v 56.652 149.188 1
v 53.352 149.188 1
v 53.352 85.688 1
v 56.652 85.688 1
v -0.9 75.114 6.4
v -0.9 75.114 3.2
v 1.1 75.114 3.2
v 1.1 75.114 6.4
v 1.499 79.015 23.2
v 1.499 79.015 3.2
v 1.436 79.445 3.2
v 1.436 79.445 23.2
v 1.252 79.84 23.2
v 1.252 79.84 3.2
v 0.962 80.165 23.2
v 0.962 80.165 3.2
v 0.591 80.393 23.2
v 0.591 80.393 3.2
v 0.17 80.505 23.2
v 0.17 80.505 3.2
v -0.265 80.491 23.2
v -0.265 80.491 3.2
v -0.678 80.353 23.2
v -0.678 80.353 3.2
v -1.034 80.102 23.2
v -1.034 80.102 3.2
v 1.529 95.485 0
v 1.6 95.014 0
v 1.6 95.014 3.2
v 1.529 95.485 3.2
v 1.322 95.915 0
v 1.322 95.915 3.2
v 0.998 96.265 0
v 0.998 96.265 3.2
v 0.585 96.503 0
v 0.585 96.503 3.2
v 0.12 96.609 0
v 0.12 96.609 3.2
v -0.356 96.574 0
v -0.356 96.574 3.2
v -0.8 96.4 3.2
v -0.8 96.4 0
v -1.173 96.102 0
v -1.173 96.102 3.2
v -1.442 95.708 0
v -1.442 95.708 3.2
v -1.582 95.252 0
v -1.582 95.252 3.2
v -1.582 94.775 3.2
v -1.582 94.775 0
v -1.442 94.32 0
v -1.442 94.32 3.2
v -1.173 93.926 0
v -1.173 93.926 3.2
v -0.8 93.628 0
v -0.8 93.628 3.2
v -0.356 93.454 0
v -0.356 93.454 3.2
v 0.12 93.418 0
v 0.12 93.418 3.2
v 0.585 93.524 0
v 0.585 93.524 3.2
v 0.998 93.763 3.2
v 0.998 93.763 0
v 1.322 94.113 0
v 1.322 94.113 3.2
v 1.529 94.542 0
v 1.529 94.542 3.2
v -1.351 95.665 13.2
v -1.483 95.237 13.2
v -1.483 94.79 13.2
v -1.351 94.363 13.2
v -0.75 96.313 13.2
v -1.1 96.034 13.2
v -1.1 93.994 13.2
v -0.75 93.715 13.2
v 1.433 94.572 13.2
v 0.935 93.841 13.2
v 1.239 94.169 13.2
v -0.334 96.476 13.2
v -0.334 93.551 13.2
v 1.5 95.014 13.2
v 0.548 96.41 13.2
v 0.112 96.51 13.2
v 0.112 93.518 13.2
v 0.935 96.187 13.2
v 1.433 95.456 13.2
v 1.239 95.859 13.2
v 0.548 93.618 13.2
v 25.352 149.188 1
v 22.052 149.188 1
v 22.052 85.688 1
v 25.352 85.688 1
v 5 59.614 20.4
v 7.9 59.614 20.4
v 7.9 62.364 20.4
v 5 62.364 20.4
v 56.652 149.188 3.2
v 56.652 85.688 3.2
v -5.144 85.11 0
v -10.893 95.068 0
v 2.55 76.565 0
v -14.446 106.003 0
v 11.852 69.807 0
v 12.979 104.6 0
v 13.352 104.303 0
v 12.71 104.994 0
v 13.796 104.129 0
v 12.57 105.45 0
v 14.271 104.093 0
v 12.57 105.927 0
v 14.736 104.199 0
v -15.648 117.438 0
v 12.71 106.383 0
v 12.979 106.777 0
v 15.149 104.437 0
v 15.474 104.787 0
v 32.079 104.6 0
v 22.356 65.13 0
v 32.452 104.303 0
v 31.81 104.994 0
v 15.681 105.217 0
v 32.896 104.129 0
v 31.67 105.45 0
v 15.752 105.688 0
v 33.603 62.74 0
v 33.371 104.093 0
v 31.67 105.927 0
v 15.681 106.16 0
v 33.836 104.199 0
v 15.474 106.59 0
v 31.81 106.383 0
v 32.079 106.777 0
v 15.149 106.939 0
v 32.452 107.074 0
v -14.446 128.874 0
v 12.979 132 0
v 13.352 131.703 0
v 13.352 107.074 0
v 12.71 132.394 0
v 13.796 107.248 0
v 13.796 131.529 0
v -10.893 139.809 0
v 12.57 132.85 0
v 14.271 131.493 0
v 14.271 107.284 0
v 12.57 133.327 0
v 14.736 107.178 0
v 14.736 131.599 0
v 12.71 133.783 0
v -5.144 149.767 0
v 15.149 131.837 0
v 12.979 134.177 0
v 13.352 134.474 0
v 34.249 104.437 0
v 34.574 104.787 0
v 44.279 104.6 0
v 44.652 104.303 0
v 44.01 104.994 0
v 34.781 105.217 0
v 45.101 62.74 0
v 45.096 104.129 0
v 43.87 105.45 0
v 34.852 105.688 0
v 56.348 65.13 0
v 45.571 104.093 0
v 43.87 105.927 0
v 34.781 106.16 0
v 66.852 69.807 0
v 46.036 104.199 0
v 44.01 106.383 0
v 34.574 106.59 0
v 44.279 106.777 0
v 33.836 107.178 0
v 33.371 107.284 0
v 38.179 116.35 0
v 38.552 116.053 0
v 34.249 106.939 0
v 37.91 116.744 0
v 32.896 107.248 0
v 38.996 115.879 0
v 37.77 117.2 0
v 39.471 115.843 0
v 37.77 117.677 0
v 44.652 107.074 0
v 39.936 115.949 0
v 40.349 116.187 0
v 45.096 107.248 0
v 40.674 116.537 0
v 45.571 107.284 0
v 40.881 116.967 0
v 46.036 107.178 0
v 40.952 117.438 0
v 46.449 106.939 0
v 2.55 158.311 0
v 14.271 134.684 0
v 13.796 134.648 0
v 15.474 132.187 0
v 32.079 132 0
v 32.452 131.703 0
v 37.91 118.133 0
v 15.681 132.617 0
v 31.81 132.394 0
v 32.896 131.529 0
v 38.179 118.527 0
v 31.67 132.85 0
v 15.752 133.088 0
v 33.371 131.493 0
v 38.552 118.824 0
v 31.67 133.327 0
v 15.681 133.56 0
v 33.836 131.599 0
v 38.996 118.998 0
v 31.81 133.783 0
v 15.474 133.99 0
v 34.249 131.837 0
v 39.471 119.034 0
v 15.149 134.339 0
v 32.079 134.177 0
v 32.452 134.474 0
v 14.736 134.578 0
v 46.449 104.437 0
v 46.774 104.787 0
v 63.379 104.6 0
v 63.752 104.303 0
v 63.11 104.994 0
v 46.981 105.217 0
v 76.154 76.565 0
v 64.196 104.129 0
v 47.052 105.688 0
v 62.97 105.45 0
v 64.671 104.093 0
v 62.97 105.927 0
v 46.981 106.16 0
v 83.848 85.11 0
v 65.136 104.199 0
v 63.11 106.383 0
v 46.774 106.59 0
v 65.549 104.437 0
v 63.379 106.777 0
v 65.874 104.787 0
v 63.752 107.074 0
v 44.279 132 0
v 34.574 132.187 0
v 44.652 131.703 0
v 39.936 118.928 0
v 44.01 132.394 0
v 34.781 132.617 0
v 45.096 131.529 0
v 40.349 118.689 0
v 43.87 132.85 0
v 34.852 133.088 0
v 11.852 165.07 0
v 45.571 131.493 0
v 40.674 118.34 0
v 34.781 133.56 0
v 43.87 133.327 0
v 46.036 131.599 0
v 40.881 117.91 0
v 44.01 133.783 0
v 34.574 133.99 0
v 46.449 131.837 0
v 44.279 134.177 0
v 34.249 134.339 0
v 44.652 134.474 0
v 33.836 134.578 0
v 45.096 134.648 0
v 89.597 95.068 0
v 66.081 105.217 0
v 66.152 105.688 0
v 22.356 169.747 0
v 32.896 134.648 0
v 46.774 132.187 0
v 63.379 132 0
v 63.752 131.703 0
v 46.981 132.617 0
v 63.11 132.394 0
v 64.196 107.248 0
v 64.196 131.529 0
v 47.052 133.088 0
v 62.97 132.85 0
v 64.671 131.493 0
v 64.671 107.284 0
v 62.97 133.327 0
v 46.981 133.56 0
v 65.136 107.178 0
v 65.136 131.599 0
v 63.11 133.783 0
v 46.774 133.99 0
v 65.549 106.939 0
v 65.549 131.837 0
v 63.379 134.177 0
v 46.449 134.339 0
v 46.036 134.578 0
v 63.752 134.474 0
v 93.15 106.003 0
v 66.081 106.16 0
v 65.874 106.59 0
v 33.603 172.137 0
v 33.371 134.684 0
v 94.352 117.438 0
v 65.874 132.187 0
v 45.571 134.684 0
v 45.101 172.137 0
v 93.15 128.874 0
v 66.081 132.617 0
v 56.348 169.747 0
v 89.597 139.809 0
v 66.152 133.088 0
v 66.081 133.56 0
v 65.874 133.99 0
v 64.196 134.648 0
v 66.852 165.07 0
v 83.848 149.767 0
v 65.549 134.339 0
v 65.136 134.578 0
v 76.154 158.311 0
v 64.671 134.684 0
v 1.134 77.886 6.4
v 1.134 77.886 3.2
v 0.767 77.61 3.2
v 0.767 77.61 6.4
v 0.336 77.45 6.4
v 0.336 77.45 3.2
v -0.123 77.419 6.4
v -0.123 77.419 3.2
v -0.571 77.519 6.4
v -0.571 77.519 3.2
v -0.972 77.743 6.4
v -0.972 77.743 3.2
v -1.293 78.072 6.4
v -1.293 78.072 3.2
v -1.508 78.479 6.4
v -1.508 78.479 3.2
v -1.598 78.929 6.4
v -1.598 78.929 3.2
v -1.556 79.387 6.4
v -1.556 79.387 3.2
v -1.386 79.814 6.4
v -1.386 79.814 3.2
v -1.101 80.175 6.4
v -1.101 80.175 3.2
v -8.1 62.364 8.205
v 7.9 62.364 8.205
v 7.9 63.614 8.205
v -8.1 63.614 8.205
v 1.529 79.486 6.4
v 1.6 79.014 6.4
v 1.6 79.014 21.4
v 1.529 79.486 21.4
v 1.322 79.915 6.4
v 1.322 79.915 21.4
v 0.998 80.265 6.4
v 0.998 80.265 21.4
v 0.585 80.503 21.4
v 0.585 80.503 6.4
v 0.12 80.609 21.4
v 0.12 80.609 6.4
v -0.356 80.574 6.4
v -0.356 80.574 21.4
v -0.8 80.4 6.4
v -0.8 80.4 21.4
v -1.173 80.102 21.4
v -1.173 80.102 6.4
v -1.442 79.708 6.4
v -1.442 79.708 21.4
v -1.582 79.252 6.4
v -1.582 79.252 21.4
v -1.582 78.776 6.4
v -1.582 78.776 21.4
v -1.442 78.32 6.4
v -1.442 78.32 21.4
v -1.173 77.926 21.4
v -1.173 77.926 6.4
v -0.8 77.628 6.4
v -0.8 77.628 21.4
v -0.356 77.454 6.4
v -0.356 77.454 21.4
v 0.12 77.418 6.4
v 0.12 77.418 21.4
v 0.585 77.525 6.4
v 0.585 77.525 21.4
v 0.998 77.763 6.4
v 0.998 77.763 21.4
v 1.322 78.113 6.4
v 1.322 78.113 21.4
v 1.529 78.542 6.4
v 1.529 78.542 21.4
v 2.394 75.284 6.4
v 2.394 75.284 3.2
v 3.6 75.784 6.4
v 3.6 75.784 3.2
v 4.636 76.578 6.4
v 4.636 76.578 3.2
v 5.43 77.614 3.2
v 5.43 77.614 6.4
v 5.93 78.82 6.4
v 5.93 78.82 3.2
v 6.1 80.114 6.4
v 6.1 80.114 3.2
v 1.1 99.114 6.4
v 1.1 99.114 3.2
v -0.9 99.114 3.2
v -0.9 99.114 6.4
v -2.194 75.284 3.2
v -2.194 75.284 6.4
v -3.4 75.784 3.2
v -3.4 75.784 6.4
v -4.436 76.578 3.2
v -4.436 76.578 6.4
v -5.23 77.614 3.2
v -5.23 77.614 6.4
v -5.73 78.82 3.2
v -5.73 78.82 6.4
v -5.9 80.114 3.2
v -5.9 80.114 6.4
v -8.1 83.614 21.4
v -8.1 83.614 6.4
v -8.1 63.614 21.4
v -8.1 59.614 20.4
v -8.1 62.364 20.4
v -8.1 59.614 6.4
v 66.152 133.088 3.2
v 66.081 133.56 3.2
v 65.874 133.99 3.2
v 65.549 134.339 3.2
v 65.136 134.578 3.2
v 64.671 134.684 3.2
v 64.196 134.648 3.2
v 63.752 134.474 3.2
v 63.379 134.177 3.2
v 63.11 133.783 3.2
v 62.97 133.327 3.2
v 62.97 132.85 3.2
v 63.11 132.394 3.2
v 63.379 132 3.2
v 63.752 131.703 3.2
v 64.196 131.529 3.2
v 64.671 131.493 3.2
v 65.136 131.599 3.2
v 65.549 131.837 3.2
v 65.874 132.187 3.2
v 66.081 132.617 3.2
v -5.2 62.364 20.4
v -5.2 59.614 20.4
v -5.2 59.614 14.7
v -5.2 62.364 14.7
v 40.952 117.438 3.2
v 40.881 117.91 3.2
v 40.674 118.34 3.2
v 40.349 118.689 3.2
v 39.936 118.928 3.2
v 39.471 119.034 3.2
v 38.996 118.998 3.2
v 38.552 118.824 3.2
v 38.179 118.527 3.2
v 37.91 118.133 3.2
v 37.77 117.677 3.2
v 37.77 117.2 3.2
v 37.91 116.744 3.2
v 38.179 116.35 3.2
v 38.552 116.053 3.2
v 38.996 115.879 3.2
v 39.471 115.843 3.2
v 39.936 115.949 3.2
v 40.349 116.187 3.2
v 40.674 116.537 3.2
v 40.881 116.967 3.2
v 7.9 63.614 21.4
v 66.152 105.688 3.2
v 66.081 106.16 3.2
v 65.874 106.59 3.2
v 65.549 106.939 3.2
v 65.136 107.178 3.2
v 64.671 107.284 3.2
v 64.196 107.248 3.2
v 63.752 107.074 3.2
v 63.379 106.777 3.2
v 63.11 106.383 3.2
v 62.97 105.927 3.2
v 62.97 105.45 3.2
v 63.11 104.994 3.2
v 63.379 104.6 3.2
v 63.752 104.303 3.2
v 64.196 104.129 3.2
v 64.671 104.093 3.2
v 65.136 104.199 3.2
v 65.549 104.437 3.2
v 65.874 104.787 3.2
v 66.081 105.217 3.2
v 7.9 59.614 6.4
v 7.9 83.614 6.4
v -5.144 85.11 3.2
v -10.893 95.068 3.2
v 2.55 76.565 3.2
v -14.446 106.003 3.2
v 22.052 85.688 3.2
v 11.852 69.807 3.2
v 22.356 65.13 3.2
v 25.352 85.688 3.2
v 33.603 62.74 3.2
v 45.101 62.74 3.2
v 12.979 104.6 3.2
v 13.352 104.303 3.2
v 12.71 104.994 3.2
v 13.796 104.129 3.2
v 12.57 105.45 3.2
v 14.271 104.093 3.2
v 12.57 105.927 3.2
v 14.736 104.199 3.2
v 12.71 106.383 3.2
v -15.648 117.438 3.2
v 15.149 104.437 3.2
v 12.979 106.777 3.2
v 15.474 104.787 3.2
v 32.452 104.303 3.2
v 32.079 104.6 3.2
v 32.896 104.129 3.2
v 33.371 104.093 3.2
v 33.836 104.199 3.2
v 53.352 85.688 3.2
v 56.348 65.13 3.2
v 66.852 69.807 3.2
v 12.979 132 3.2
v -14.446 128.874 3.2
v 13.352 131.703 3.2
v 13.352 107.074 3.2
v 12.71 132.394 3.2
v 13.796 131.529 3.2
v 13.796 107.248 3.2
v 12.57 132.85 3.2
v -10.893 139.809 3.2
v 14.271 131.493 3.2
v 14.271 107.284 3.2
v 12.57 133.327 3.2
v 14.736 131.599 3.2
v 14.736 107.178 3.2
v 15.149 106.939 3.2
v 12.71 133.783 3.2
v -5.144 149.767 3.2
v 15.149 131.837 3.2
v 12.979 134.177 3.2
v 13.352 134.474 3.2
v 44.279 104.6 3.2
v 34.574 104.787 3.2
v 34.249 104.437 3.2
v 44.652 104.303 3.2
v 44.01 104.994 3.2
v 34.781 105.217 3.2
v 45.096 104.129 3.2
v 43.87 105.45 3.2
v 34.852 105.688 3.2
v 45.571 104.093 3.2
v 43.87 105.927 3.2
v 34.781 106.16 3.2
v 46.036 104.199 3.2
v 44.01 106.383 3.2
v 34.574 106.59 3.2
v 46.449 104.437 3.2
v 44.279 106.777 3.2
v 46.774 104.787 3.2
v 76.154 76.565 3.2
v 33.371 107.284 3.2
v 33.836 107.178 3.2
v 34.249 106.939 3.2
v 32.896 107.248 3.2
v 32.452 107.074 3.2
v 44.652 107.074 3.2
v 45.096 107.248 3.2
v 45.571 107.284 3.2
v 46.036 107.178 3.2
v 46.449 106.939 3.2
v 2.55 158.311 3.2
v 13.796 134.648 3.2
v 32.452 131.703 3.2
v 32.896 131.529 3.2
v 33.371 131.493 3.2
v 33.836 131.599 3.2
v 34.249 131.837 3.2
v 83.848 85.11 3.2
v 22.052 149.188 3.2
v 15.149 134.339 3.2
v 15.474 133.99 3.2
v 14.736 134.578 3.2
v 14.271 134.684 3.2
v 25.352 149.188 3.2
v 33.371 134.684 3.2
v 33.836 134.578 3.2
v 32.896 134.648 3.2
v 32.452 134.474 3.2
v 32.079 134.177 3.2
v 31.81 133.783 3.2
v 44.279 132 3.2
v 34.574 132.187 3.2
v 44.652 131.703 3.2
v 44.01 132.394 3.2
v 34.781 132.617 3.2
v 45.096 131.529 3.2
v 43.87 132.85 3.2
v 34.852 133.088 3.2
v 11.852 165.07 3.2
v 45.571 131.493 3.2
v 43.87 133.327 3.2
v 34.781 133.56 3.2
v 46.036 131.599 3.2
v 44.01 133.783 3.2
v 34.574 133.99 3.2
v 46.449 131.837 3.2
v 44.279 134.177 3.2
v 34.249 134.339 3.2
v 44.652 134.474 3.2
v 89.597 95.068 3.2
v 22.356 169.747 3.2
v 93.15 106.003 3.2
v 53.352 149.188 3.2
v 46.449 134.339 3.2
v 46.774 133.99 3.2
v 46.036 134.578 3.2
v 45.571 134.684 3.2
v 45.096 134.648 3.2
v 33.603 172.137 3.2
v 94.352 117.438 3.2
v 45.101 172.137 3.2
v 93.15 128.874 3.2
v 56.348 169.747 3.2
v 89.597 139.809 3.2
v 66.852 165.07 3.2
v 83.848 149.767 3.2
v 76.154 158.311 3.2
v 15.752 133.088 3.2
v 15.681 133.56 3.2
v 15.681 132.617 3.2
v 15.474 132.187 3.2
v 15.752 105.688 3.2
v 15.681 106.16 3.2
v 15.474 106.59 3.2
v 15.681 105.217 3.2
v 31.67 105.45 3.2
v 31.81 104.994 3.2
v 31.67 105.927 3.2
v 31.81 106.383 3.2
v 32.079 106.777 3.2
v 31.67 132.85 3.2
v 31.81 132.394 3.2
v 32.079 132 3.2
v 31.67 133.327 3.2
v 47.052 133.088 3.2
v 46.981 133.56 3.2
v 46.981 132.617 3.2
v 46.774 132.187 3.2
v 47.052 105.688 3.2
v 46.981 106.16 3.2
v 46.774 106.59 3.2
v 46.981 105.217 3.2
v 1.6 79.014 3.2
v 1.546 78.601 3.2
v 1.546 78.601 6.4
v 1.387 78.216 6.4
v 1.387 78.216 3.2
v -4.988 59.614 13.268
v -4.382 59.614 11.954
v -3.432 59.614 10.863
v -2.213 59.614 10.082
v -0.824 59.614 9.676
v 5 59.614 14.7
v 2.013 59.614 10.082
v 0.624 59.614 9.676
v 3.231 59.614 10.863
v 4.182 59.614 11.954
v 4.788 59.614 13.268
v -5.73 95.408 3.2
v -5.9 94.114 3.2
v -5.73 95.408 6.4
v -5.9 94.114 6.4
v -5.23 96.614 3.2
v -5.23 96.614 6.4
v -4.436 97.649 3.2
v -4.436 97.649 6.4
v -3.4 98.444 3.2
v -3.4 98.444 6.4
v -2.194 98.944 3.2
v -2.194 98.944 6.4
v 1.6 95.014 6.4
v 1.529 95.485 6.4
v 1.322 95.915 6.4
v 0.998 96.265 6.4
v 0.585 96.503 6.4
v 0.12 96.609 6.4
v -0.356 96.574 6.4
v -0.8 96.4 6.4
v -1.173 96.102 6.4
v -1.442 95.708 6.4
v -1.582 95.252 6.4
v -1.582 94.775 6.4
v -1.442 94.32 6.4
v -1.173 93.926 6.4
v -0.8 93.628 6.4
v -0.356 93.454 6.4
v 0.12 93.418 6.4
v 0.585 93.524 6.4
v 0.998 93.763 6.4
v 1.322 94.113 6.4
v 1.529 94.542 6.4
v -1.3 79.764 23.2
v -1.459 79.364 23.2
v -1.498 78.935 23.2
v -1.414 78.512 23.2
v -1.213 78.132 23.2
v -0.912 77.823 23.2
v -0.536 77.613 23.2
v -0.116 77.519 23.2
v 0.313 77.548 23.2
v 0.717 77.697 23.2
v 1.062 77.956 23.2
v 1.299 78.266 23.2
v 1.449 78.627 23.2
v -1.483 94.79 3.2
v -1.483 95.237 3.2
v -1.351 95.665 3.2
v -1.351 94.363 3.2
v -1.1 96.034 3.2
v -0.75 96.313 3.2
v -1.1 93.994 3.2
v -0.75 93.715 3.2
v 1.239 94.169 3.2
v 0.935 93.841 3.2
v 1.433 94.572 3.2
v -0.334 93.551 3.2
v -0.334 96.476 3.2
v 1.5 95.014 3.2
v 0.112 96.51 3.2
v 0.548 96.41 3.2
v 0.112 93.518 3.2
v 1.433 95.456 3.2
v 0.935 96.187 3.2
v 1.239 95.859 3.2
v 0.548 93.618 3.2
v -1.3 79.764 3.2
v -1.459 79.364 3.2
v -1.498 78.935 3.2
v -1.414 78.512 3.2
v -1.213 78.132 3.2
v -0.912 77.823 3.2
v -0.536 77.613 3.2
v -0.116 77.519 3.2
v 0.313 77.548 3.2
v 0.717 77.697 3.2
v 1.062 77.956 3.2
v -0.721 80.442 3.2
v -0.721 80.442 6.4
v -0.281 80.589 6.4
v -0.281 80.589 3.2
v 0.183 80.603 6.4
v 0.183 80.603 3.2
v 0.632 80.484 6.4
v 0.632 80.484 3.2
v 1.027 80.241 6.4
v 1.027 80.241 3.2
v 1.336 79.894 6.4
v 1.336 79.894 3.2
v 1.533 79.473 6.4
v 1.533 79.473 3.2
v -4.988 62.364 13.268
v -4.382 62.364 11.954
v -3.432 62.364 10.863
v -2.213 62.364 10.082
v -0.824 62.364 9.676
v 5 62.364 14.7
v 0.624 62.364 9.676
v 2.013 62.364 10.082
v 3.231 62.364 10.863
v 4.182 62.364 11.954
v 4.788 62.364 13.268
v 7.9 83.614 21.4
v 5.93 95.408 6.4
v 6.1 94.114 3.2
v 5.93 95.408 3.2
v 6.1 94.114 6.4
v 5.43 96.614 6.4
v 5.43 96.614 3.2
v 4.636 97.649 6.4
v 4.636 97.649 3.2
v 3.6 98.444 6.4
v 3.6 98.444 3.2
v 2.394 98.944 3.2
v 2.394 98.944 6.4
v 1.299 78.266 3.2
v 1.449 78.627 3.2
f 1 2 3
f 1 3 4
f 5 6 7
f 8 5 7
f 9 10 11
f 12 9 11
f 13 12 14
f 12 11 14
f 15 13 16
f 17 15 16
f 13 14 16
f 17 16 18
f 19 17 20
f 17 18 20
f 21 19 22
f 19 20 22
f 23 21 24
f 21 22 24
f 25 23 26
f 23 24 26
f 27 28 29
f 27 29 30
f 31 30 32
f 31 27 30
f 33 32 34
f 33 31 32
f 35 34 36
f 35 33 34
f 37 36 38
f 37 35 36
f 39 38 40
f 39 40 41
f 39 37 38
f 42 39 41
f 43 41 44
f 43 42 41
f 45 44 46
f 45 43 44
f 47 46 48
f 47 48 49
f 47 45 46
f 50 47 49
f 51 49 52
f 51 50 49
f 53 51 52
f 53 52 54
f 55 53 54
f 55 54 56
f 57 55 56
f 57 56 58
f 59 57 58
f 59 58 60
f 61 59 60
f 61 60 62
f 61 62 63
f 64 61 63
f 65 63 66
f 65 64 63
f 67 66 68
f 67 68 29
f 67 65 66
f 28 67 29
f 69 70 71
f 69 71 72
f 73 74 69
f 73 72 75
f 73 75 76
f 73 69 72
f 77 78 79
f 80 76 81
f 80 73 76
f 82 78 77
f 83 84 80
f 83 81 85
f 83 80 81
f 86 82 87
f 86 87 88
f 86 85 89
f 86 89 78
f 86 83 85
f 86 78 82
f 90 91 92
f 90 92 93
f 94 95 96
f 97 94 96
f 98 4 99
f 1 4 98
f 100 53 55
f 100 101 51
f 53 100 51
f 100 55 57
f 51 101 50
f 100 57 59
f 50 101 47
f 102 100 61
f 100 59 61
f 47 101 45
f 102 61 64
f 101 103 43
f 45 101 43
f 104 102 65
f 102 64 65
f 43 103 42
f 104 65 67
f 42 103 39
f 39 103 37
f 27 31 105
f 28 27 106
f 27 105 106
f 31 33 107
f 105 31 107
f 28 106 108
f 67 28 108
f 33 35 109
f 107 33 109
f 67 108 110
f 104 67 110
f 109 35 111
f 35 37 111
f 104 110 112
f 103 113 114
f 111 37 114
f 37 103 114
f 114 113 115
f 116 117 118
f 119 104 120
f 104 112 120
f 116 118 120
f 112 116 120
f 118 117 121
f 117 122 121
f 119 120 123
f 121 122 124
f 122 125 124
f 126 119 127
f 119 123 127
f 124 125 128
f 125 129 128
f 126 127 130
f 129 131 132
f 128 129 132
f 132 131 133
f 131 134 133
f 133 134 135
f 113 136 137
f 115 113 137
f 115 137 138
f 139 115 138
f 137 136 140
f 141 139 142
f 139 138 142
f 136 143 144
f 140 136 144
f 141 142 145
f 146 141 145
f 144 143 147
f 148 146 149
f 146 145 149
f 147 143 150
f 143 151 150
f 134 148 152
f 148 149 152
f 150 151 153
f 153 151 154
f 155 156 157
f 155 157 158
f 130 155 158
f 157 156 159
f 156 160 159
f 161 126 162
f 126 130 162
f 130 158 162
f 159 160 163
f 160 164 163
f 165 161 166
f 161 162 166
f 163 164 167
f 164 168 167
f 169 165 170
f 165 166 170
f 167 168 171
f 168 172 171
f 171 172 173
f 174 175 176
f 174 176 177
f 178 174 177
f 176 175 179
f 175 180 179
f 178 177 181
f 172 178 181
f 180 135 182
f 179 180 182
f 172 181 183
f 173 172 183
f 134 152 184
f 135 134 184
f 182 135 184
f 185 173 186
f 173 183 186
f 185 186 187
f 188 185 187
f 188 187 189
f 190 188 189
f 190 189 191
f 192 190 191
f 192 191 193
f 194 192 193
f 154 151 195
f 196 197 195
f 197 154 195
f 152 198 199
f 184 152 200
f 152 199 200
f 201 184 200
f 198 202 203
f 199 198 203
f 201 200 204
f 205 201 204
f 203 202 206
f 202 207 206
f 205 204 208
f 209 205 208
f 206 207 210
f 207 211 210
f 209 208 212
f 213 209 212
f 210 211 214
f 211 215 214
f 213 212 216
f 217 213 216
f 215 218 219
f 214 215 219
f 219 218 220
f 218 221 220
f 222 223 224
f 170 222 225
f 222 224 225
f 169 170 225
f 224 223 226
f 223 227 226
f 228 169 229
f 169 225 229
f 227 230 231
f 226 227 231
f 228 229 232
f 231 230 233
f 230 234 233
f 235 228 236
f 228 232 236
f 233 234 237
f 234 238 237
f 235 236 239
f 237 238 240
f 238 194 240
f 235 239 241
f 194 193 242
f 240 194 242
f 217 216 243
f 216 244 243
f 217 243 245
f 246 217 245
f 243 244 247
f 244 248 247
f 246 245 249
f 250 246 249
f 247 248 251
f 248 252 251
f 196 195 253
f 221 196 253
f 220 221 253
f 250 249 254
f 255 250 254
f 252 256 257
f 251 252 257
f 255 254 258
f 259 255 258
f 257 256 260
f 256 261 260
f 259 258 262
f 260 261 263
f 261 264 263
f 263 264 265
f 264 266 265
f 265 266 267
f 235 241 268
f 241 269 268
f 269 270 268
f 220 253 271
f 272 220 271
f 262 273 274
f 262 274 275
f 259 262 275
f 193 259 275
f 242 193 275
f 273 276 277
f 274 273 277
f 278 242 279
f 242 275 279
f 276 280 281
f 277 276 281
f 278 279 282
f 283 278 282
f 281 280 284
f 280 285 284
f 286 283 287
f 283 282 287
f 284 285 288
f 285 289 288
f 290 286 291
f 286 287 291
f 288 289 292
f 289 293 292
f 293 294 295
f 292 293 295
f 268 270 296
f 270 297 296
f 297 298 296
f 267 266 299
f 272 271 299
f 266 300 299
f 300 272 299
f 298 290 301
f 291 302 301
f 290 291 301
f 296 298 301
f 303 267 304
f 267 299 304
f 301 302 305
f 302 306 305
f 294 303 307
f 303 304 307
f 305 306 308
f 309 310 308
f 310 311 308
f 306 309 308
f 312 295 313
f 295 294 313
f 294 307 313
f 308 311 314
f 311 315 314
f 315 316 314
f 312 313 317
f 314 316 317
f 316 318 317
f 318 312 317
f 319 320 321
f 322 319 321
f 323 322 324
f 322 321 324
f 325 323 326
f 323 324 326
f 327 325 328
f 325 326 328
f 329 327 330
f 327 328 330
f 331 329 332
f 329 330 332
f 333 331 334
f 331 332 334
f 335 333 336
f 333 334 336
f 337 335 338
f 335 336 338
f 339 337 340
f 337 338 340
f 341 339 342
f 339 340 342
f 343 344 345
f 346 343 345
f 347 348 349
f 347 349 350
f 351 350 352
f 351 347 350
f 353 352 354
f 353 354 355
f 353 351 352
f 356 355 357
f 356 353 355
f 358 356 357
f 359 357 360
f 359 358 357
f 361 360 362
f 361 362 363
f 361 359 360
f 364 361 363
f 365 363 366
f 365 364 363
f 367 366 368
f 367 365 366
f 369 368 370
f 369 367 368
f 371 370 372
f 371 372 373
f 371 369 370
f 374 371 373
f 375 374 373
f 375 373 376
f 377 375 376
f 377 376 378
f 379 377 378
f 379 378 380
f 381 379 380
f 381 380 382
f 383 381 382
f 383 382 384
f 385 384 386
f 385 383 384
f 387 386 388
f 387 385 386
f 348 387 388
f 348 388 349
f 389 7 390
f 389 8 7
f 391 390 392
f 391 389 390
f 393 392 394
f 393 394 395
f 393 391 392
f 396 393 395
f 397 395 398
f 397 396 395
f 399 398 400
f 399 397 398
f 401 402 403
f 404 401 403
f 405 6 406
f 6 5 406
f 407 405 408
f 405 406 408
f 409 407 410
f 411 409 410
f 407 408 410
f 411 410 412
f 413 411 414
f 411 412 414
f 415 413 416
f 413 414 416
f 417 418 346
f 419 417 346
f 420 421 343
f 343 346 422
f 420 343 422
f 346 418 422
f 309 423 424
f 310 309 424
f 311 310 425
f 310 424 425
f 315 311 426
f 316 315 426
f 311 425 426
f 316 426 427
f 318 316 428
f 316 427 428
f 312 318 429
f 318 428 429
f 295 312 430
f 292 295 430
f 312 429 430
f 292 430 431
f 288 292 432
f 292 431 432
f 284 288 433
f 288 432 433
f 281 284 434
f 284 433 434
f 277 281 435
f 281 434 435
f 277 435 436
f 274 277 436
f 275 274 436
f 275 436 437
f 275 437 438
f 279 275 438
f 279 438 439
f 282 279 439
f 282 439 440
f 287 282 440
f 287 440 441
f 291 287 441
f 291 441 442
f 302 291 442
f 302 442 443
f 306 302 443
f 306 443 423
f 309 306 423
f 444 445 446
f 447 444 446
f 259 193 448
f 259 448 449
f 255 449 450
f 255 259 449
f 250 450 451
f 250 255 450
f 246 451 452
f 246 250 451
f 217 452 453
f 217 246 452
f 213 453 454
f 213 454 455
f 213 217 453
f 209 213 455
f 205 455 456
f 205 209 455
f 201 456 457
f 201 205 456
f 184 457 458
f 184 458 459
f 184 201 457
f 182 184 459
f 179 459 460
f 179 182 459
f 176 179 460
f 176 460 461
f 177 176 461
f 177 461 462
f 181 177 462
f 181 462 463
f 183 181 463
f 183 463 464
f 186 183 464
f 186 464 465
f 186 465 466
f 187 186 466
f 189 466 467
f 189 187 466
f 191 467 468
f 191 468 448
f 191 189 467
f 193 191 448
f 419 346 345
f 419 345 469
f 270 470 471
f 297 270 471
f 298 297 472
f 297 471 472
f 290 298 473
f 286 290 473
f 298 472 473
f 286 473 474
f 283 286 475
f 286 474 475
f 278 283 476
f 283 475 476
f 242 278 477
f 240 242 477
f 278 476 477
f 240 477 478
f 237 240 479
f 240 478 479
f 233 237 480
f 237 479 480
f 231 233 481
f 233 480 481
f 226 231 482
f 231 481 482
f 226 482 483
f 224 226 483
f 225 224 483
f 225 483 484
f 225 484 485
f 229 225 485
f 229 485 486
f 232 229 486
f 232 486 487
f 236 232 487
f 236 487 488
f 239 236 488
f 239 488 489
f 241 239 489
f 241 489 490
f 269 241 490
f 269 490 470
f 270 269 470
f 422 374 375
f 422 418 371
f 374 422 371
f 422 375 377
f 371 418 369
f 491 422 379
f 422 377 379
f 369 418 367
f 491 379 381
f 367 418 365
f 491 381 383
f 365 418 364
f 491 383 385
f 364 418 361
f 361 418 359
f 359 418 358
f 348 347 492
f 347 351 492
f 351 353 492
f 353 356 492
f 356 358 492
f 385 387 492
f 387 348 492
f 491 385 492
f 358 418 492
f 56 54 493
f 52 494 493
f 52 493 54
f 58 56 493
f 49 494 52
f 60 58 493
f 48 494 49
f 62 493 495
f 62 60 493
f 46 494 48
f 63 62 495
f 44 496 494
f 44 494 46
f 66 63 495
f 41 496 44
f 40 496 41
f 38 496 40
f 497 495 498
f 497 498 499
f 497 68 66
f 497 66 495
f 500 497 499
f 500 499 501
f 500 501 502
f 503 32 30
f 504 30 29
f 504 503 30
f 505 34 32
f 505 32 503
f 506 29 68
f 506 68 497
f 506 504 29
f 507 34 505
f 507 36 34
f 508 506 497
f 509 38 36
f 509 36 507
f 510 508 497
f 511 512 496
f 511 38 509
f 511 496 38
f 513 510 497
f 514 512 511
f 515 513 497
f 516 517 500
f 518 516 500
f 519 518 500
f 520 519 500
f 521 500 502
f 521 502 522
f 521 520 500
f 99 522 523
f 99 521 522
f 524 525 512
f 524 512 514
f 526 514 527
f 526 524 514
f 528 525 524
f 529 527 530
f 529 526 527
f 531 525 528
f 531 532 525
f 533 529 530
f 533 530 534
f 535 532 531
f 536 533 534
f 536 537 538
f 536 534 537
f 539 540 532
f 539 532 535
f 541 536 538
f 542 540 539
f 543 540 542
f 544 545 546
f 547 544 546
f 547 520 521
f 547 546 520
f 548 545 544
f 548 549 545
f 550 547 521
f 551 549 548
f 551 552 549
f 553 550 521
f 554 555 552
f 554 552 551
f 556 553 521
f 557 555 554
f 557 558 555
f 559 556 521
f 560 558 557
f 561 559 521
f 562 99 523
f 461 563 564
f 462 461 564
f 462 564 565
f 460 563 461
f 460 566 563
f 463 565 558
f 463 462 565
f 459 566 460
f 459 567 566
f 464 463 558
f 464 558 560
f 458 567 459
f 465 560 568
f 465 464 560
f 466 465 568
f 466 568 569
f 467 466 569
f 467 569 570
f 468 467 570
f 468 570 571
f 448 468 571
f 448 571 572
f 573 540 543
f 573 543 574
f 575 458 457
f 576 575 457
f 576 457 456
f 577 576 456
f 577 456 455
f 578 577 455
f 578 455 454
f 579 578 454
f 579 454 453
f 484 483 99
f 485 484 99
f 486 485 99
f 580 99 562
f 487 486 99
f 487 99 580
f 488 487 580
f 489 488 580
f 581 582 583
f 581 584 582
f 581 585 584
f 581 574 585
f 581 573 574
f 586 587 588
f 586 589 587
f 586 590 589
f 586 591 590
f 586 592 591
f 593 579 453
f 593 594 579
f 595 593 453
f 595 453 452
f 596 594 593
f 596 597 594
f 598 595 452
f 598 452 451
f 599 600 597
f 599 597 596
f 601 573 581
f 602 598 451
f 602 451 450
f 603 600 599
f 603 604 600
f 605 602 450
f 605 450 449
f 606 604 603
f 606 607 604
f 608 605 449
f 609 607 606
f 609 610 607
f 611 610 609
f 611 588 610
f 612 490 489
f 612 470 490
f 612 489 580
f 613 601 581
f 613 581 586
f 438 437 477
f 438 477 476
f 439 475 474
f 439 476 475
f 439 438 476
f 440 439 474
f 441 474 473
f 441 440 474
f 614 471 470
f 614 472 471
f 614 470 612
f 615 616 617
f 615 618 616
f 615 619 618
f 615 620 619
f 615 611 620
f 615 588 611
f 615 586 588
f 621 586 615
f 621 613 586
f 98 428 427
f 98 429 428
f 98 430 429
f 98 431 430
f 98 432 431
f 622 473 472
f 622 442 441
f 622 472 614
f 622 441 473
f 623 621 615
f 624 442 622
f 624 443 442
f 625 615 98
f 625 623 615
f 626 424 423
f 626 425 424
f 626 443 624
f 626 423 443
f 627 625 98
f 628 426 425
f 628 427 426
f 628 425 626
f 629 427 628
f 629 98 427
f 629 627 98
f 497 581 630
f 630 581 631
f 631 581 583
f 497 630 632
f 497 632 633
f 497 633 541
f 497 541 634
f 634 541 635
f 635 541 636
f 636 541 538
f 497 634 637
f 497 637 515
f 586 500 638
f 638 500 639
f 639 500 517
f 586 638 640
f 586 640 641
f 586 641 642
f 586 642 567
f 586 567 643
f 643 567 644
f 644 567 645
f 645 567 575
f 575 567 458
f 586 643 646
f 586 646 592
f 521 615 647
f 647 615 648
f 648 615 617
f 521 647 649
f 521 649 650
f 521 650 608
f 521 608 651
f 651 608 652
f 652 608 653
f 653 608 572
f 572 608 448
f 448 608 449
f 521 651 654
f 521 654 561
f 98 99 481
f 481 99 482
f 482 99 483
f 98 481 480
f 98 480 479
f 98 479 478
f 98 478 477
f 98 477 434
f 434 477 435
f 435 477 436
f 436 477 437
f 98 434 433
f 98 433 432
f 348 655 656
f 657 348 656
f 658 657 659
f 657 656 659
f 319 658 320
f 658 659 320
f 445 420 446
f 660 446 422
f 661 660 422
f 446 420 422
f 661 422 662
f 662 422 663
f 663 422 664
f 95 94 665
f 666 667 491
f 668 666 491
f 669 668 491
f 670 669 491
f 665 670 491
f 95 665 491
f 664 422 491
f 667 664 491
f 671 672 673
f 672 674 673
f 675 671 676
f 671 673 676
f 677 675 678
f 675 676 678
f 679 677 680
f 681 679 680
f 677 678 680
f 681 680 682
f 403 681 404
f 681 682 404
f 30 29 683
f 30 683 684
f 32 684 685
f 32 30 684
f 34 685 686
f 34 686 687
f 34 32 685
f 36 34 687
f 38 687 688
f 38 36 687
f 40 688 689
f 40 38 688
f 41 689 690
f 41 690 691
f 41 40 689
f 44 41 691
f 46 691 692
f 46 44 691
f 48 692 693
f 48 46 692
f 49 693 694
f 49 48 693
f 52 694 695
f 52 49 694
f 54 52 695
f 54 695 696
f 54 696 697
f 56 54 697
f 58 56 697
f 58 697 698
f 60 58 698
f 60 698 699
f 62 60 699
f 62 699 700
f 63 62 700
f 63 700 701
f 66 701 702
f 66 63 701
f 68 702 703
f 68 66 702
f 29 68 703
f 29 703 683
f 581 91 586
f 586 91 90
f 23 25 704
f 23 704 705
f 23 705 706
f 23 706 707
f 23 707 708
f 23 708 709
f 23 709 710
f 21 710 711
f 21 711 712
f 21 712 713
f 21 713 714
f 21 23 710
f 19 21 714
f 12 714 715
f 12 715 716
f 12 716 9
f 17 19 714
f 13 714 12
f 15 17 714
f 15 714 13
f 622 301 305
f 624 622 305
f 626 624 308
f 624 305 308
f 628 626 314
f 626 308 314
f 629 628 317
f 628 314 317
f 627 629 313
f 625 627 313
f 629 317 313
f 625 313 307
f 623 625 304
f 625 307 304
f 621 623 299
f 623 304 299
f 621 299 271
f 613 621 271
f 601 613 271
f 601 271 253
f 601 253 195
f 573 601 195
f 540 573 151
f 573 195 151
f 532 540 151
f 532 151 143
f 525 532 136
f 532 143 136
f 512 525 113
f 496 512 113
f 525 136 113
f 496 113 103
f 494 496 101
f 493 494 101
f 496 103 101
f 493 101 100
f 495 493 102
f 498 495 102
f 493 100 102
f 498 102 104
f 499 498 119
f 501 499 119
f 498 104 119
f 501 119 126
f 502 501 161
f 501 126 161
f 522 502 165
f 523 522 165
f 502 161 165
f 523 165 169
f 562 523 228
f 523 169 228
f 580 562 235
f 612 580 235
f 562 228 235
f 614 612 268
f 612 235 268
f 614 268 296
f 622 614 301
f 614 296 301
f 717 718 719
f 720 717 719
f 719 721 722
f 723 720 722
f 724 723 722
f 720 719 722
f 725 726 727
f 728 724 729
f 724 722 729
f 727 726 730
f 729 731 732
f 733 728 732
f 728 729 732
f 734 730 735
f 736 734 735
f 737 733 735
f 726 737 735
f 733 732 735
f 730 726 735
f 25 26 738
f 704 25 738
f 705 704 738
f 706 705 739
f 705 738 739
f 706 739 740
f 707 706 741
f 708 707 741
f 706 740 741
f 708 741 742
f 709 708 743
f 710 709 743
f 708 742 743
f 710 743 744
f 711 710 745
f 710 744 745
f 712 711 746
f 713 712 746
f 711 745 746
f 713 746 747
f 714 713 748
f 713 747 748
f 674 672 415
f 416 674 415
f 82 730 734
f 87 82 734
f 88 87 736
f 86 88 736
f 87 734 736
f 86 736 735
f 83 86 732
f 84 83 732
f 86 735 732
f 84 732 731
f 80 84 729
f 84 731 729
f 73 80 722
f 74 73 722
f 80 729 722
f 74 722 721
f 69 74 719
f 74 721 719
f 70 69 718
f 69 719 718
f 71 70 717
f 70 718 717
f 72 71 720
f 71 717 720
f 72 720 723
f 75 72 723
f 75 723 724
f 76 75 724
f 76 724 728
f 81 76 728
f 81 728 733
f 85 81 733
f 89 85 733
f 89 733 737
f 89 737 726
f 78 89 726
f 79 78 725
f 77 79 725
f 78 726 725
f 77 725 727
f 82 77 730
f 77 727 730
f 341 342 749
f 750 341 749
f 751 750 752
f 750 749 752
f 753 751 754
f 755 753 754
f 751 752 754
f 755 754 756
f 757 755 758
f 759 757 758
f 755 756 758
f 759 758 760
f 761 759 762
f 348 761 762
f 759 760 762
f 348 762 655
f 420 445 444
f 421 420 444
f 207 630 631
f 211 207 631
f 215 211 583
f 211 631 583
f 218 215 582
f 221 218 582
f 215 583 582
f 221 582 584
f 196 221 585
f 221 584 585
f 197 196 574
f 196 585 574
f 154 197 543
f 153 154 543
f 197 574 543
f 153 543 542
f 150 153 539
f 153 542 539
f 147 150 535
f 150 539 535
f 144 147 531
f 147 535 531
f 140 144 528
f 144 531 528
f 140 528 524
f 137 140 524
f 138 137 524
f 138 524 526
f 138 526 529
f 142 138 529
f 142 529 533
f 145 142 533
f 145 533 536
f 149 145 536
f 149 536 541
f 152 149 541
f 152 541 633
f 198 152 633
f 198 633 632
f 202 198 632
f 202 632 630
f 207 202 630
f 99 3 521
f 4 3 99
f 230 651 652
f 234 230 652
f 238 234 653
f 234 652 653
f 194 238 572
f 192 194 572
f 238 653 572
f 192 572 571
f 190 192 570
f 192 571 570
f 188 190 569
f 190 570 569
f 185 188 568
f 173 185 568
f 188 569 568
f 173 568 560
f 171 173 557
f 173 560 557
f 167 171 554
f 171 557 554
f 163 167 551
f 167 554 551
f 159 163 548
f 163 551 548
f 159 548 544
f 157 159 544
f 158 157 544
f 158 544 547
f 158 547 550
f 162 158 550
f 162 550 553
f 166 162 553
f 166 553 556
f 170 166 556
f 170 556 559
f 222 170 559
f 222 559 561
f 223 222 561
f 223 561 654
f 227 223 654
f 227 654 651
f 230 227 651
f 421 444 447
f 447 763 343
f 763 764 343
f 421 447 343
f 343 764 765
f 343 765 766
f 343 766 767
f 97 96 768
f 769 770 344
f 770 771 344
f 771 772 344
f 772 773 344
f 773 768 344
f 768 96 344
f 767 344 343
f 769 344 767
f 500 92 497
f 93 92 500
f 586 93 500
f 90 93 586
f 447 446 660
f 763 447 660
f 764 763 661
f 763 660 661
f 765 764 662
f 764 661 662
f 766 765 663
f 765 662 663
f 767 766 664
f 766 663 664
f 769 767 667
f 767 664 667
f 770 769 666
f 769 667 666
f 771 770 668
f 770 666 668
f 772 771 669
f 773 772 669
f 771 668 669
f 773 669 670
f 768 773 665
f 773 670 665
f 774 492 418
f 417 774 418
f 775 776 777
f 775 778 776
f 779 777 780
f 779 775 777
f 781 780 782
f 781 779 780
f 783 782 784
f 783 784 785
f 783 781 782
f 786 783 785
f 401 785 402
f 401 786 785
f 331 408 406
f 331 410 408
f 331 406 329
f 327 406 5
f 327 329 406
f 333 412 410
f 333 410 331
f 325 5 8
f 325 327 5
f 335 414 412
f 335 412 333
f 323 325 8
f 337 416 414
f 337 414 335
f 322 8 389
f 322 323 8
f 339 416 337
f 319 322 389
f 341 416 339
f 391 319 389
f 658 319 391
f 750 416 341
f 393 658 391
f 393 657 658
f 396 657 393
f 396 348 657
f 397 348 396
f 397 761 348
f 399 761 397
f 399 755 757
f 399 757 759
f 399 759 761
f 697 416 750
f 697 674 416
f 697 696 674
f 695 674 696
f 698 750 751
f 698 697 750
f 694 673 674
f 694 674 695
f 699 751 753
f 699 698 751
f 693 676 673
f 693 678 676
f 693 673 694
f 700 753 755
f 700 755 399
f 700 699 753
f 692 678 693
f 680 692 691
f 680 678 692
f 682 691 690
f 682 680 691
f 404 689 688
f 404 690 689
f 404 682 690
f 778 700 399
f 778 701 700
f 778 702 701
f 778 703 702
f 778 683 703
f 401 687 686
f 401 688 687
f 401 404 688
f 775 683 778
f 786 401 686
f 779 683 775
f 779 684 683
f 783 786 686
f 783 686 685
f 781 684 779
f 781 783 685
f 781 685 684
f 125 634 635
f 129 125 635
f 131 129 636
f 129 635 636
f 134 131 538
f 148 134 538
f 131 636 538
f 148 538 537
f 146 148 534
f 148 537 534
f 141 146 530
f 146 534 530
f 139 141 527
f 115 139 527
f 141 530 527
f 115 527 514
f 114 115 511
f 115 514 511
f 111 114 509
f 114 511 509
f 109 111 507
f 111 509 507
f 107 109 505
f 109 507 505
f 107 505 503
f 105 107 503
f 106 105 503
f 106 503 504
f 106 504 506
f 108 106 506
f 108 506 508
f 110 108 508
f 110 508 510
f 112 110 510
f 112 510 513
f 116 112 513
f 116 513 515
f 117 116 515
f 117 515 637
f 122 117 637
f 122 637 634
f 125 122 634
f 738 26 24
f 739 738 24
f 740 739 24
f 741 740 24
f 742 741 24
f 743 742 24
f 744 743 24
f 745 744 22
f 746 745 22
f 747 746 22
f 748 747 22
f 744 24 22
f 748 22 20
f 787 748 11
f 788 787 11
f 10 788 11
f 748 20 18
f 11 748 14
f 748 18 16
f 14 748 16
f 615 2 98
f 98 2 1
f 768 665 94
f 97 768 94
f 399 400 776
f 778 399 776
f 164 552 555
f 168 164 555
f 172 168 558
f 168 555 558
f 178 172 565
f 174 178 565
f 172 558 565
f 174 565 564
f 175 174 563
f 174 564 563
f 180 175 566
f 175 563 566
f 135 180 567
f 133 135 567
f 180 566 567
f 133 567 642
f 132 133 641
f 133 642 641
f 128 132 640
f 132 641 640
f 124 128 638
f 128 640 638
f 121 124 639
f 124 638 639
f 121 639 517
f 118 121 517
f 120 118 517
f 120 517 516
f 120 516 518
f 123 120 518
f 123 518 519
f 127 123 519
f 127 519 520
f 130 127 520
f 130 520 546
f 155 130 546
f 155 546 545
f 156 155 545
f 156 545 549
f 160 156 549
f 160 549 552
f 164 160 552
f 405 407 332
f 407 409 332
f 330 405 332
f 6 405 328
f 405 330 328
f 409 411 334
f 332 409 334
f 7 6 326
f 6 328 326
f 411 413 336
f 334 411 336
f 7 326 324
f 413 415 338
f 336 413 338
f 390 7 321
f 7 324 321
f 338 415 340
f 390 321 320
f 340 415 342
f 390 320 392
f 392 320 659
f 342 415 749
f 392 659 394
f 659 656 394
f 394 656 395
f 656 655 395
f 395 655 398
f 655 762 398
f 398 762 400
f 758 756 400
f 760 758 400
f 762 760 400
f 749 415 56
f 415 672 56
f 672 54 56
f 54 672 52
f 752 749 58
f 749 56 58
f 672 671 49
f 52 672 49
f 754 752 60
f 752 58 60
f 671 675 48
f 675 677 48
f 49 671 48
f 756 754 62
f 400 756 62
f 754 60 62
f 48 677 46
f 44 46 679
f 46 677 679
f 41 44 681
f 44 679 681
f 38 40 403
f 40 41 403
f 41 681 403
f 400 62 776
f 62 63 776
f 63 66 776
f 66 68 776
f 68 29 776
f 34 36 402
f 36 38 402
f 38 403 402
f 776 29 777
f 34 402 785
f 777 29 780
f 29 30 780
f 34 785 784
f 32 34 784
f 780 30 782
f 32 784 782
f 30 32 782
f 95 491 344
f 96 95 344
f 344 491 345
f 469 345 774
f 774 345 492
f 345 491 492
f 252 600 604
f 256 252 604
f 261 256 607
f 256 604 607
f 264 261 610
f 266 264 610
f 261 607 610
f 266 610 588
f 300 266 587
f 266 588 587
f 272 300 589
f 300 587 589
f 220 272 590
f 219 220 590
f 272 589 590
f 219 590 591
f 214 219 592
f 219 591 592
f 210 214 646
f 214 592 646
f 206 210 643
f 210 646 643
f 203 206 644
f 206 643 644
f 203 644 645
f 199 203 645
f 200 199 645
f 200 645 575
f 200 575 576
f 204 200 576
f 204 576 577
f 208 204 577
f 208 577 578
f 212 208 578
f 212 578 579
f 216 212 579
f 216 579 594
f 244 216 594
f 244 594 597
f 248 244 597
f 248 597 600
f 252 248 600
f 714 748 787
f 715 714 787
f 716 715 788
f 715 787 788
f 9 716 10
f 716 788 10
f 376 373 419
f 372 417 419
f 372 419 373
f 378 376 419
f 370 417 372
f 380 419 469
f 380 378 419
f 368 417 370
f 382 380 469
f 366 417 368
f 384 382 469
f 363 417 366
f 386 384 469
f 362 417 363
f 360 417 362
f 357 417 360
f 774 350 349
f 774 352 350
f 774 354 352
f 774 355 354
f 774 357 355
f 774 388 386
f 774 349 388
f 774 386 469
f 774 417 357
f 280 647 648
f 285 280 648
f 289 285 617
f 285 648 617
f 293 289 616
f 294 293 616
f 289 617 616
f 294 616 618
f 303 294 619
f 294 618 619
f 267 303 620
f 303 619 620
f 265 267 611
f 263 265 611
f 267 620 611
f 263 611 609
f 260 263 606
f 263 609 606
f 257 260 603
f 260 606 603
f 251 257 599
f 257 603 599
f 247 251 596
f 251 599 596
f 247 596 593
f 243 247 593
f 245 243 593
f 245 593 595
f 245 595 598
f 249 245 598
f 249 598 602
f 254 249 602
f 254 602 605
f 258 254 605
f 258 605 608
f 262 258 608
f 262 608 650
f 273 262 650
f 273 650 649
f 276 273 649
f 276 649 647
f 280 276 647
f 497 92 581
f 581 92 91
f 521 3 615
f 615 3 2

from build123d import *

# Parameters (mm, degrees)
F0_R      = 55
F0_R_2    = 1.6
F0_W      = 3.3
F0_H      = 63.5
F1_DEPTH  = 3.2
F2_DEPTH  = 1
F3_R      = 1.5
F4_DEPTH  = 10
F5_R      = 1.6
F6_DEPTH  = 3.2
F7_R      = 5
F9_DEPTH  = 20
F10_R     = 1.6
F11_DEPTH = 15
F13_DEPTH = 25
F14_R     = 1.6
F15_DEPTH = 8
F17_DEPTH = 2.75


with BuildPart() as f1:
    # F0 (on Top) → F1 (new body)
    with BuildSketch(Plane.XY):
        with Locations((39.351791, 117.438398)):
            Circle(F0_R)
        with Locations((0, 95.013872)):
            Circle(F0_R_2, mode=Mode.SUBTRACT)
        with Locations((23.701791, 117.438398)):
            Rectangle(F0_W, F0_H, mode=Mode.SUBTRACT)
        with Locations((39.351791, 117.438398)):
            Circle(F0_R_2, mode=Mode.SUBTRACT)
        with Locations((55.001791, 117.438398)):
            Rectangle(F0_W, F0_H, mode=Mode.SUBTRACT)
    extrude(amount=F1_DEPTH)

    # F0 (on Top) → F2 (join)
    with BuildSketch(Plane.XY):
        with Locations((23.701791, 117.438398)):
            Rectangle(F0_W, F0_H)
        with Locations((55.001791, 117.438398)):
            Rectangle(F0_W, F0_H)
    extrude(amount=F2_DEPTH)

    # F14 (on face) → F15 (cut)
    with BuildSketch(Plane.XY.offset(3.2)):
        with Locations((64.551791, 105.688398)):
            Circle(F14_R)
        with Locations((64.551791, 133.088398)):
            Circle(F14_R)
        with Locations((45.451791, 133.088398)):
            Circle(F14_R)
        with Locations((45.451791, 105.688398)):
            Circle(F14_R)
        with Locations((33.251791, 105.688398)):
            Circle(F14_R)
        with Locations((33.251791, 133.088398)):
            Circle(F14_R)
        with Locations((14.151791, 133.088398)):
            Circle(F14_R)
        with Locations((14.151791, 105.688398)):
            Circle(F14_R)
    extrude(amount=-F15_DEPTH, mode=Mode.SUBTRACT)


with BuildPart() as f4:
    # F3 (on face) → F4 (new body)
    with BuildSketch(Plane.XY.offset(3.2)):
        with Locations((0, 95.013872)):
            Circle(F3_R)
    extrude(amount=F4_DEPTH)


with BuildPart() as f6:
    # F5 (on face) → F6 (new body)
    with BuildSketch(Plane.XY.offset(3.2)):
        with BuildLine():
            ThreePointArc((-1.101032, 80.174889), (-3.605473, 83.092024), (-5.9, 86.176994))
            Line((-5.9, 86.176994), (-5.9, 75.113872))
            Line((-5.9, 75.113872), (4.228658, 75.113872))
            ThreePointArc((4.228658, 75.113872), (2.655319, 76.470497), (1.134335, 77.885573))
            ThreePointArc((1.134335, 77.885573), (-1.144779, 77.896171), (-1.101032, 80.174889))
        make_face()
        with BuildLine():
            Line((6.1, 99.113872), (-5.9, 99.113872))
            Line((-5.9, 99.113872), (-5.9, 86.176994))
            ThreePointArc((-5.9, 86.176994), (-3.605473, 83.092024), (-1.101032, 80.174889))
            ThreePointArc((-1.101032, 80.174889), (0.631803, 80.483947), (1.6, 79.013972))
            ThreePointArc((1.6, 79.013972), (1.479009, 78.403618), (1.134335, 77.885573))
            ThreePointArc((1.134335, 77.885573), (2.655319, 76.470497), (4.228658, 75.113872))
            Line((4.228658, 75.113872), (6.1, 75.113872))
            Line((6.1, 75.113872), (6.1, 99.113872))
        make_face()
        with Locations((0, 95.013872)):
            Circle(F5_R, mode=Mode.SUBTRACT)
    extrude(amount=F6_DEPTH)

    # F7
    f7_edges = [f6.edges().sort_by_distance(p)[0] for p in [
        (-5.9, 99.113872, 4.8),
        (6.1, 99.113872, 4.8),
        (6.1, 75.113872, 4.8),
        (-5.9, 75.113872, 4.8),
    ]]
    fillet(f7_edges, radius=F7_R)


with BuildPart() as f9:
    # F8 (on face) → F9 (new body)
    with BuildSketch(Plane.XY.offset(3.2)):
        with BuildLine():
            ThreePointArc((1.061891, 77.955699), (1.385737, 78.441707), (1.499431, 79.014555))
            ThreePointArc((1.499431, 79.014555), (0.591129, 80.392921), (-1.03376, 80.101991))
            ThreePointArc((-1.03376, 80.101991), (-0.000569, 79.014555), (1.061891, 77.955699))
        make_face()
        with BuildLine():
            ThreePointArc((1.061891, 77.955699), (-0.000569, 79.014555), (-1.03376, 80.101991))
            ThreePointArc((-1.03376, 80.101991), (-1.073815, 77.966632), (1.061891, 77.955699))
        make_face()
    extrude(amount=F9_DEPTH)


with BuildPart() as f11:
    # F10 (on face) → F11 (new body)
    with BuildSketch(Plane.XY.offset(6.4)):
        with BuildLine():
            Line((-5.9, 83.613972), (-8.1, 83.613972))
            Line((-8.1, 83.613972), (-8.1, 59.613972))
            Line((-8.1, 59.613972), (7.9, 59.613972))
            Line((7.9, 59.613972), (7.9, 83.613972))
            Line((7.9, 83.613972), (6.1, 83.613972))
            Line((6.1, 83.613972), (6.1, 80.113872))
            ThreePointArc((6.1, 80.113872), (4.635534, 76.578338), (1.1, 75.113872))
            Line((1.1, 75.113872), (-0.9, 75.113872))
            ThreePointArc((-0.9, 75.113872), (-4.435534, 76.578338), (-5.9, 80.113872))
            Line((-5.9, 80.113872), (-5.9, 83.613972))
        make_face()
        with BuildLine():
            Line((6.1, 83.613972), (-5.9, 83.613972))
            Line((-5.9, 83.613972), (-5.9, 80.113872))
            ThreePointArc((-5.9, 80.113872), (-4.435534, 76.578338), (-0.9, 75.113872))
            Line((-0.9, 75.113872), (1.1, 75.113872))
            ThreePointArc((1.1, 75.113872), (4.635534, 76.578338), (6.1, 80.113872))
            Line((6.1, 80.113872), (6.1, 83.613972))
        make_face()
        with Locations((0, 79.013972)):
            Circle(F10_R, mode=Mode.SUBTRACT)
    extrude(amount=F11_DEPTH)

    # F12 (on face) → F13 (cut)
    with BuildSketch(Plane.YZ.offset(7.9)):
        Polygon((63.613972, 21.4), (59.613972, 21.4), (59.613972, 20.4), (62.363972, 20.4), (62.363972, 8.205), (63.613972, 8.205), align=None)
    extrude(amount=-F13_DEPTH, mode=Mode.SUBTRACT)

    # F16 (on face) → F17 (cut)
    with BuildSketch(Plane.XZ.offset(-59.613972)):
        with BuildLine():
            Line((-5.2, 20.4), (-5.2, 14.7))
            ThreePointArc((-5.2, 14.7), (-0.100056, 9.62396), (4.999887, 14.7))
            Line((4.999887, 14.7), (4.999887, 20.4))
            Line((4.999887, 20.4), (-5.2, 20.4))
        make_face()
    extrude(amount=-F17_DEPTH, mode=Mode.SUBTRACT)


solid = Compound([f1.part, f4.part, f6.part, f9.part, f11.part])
